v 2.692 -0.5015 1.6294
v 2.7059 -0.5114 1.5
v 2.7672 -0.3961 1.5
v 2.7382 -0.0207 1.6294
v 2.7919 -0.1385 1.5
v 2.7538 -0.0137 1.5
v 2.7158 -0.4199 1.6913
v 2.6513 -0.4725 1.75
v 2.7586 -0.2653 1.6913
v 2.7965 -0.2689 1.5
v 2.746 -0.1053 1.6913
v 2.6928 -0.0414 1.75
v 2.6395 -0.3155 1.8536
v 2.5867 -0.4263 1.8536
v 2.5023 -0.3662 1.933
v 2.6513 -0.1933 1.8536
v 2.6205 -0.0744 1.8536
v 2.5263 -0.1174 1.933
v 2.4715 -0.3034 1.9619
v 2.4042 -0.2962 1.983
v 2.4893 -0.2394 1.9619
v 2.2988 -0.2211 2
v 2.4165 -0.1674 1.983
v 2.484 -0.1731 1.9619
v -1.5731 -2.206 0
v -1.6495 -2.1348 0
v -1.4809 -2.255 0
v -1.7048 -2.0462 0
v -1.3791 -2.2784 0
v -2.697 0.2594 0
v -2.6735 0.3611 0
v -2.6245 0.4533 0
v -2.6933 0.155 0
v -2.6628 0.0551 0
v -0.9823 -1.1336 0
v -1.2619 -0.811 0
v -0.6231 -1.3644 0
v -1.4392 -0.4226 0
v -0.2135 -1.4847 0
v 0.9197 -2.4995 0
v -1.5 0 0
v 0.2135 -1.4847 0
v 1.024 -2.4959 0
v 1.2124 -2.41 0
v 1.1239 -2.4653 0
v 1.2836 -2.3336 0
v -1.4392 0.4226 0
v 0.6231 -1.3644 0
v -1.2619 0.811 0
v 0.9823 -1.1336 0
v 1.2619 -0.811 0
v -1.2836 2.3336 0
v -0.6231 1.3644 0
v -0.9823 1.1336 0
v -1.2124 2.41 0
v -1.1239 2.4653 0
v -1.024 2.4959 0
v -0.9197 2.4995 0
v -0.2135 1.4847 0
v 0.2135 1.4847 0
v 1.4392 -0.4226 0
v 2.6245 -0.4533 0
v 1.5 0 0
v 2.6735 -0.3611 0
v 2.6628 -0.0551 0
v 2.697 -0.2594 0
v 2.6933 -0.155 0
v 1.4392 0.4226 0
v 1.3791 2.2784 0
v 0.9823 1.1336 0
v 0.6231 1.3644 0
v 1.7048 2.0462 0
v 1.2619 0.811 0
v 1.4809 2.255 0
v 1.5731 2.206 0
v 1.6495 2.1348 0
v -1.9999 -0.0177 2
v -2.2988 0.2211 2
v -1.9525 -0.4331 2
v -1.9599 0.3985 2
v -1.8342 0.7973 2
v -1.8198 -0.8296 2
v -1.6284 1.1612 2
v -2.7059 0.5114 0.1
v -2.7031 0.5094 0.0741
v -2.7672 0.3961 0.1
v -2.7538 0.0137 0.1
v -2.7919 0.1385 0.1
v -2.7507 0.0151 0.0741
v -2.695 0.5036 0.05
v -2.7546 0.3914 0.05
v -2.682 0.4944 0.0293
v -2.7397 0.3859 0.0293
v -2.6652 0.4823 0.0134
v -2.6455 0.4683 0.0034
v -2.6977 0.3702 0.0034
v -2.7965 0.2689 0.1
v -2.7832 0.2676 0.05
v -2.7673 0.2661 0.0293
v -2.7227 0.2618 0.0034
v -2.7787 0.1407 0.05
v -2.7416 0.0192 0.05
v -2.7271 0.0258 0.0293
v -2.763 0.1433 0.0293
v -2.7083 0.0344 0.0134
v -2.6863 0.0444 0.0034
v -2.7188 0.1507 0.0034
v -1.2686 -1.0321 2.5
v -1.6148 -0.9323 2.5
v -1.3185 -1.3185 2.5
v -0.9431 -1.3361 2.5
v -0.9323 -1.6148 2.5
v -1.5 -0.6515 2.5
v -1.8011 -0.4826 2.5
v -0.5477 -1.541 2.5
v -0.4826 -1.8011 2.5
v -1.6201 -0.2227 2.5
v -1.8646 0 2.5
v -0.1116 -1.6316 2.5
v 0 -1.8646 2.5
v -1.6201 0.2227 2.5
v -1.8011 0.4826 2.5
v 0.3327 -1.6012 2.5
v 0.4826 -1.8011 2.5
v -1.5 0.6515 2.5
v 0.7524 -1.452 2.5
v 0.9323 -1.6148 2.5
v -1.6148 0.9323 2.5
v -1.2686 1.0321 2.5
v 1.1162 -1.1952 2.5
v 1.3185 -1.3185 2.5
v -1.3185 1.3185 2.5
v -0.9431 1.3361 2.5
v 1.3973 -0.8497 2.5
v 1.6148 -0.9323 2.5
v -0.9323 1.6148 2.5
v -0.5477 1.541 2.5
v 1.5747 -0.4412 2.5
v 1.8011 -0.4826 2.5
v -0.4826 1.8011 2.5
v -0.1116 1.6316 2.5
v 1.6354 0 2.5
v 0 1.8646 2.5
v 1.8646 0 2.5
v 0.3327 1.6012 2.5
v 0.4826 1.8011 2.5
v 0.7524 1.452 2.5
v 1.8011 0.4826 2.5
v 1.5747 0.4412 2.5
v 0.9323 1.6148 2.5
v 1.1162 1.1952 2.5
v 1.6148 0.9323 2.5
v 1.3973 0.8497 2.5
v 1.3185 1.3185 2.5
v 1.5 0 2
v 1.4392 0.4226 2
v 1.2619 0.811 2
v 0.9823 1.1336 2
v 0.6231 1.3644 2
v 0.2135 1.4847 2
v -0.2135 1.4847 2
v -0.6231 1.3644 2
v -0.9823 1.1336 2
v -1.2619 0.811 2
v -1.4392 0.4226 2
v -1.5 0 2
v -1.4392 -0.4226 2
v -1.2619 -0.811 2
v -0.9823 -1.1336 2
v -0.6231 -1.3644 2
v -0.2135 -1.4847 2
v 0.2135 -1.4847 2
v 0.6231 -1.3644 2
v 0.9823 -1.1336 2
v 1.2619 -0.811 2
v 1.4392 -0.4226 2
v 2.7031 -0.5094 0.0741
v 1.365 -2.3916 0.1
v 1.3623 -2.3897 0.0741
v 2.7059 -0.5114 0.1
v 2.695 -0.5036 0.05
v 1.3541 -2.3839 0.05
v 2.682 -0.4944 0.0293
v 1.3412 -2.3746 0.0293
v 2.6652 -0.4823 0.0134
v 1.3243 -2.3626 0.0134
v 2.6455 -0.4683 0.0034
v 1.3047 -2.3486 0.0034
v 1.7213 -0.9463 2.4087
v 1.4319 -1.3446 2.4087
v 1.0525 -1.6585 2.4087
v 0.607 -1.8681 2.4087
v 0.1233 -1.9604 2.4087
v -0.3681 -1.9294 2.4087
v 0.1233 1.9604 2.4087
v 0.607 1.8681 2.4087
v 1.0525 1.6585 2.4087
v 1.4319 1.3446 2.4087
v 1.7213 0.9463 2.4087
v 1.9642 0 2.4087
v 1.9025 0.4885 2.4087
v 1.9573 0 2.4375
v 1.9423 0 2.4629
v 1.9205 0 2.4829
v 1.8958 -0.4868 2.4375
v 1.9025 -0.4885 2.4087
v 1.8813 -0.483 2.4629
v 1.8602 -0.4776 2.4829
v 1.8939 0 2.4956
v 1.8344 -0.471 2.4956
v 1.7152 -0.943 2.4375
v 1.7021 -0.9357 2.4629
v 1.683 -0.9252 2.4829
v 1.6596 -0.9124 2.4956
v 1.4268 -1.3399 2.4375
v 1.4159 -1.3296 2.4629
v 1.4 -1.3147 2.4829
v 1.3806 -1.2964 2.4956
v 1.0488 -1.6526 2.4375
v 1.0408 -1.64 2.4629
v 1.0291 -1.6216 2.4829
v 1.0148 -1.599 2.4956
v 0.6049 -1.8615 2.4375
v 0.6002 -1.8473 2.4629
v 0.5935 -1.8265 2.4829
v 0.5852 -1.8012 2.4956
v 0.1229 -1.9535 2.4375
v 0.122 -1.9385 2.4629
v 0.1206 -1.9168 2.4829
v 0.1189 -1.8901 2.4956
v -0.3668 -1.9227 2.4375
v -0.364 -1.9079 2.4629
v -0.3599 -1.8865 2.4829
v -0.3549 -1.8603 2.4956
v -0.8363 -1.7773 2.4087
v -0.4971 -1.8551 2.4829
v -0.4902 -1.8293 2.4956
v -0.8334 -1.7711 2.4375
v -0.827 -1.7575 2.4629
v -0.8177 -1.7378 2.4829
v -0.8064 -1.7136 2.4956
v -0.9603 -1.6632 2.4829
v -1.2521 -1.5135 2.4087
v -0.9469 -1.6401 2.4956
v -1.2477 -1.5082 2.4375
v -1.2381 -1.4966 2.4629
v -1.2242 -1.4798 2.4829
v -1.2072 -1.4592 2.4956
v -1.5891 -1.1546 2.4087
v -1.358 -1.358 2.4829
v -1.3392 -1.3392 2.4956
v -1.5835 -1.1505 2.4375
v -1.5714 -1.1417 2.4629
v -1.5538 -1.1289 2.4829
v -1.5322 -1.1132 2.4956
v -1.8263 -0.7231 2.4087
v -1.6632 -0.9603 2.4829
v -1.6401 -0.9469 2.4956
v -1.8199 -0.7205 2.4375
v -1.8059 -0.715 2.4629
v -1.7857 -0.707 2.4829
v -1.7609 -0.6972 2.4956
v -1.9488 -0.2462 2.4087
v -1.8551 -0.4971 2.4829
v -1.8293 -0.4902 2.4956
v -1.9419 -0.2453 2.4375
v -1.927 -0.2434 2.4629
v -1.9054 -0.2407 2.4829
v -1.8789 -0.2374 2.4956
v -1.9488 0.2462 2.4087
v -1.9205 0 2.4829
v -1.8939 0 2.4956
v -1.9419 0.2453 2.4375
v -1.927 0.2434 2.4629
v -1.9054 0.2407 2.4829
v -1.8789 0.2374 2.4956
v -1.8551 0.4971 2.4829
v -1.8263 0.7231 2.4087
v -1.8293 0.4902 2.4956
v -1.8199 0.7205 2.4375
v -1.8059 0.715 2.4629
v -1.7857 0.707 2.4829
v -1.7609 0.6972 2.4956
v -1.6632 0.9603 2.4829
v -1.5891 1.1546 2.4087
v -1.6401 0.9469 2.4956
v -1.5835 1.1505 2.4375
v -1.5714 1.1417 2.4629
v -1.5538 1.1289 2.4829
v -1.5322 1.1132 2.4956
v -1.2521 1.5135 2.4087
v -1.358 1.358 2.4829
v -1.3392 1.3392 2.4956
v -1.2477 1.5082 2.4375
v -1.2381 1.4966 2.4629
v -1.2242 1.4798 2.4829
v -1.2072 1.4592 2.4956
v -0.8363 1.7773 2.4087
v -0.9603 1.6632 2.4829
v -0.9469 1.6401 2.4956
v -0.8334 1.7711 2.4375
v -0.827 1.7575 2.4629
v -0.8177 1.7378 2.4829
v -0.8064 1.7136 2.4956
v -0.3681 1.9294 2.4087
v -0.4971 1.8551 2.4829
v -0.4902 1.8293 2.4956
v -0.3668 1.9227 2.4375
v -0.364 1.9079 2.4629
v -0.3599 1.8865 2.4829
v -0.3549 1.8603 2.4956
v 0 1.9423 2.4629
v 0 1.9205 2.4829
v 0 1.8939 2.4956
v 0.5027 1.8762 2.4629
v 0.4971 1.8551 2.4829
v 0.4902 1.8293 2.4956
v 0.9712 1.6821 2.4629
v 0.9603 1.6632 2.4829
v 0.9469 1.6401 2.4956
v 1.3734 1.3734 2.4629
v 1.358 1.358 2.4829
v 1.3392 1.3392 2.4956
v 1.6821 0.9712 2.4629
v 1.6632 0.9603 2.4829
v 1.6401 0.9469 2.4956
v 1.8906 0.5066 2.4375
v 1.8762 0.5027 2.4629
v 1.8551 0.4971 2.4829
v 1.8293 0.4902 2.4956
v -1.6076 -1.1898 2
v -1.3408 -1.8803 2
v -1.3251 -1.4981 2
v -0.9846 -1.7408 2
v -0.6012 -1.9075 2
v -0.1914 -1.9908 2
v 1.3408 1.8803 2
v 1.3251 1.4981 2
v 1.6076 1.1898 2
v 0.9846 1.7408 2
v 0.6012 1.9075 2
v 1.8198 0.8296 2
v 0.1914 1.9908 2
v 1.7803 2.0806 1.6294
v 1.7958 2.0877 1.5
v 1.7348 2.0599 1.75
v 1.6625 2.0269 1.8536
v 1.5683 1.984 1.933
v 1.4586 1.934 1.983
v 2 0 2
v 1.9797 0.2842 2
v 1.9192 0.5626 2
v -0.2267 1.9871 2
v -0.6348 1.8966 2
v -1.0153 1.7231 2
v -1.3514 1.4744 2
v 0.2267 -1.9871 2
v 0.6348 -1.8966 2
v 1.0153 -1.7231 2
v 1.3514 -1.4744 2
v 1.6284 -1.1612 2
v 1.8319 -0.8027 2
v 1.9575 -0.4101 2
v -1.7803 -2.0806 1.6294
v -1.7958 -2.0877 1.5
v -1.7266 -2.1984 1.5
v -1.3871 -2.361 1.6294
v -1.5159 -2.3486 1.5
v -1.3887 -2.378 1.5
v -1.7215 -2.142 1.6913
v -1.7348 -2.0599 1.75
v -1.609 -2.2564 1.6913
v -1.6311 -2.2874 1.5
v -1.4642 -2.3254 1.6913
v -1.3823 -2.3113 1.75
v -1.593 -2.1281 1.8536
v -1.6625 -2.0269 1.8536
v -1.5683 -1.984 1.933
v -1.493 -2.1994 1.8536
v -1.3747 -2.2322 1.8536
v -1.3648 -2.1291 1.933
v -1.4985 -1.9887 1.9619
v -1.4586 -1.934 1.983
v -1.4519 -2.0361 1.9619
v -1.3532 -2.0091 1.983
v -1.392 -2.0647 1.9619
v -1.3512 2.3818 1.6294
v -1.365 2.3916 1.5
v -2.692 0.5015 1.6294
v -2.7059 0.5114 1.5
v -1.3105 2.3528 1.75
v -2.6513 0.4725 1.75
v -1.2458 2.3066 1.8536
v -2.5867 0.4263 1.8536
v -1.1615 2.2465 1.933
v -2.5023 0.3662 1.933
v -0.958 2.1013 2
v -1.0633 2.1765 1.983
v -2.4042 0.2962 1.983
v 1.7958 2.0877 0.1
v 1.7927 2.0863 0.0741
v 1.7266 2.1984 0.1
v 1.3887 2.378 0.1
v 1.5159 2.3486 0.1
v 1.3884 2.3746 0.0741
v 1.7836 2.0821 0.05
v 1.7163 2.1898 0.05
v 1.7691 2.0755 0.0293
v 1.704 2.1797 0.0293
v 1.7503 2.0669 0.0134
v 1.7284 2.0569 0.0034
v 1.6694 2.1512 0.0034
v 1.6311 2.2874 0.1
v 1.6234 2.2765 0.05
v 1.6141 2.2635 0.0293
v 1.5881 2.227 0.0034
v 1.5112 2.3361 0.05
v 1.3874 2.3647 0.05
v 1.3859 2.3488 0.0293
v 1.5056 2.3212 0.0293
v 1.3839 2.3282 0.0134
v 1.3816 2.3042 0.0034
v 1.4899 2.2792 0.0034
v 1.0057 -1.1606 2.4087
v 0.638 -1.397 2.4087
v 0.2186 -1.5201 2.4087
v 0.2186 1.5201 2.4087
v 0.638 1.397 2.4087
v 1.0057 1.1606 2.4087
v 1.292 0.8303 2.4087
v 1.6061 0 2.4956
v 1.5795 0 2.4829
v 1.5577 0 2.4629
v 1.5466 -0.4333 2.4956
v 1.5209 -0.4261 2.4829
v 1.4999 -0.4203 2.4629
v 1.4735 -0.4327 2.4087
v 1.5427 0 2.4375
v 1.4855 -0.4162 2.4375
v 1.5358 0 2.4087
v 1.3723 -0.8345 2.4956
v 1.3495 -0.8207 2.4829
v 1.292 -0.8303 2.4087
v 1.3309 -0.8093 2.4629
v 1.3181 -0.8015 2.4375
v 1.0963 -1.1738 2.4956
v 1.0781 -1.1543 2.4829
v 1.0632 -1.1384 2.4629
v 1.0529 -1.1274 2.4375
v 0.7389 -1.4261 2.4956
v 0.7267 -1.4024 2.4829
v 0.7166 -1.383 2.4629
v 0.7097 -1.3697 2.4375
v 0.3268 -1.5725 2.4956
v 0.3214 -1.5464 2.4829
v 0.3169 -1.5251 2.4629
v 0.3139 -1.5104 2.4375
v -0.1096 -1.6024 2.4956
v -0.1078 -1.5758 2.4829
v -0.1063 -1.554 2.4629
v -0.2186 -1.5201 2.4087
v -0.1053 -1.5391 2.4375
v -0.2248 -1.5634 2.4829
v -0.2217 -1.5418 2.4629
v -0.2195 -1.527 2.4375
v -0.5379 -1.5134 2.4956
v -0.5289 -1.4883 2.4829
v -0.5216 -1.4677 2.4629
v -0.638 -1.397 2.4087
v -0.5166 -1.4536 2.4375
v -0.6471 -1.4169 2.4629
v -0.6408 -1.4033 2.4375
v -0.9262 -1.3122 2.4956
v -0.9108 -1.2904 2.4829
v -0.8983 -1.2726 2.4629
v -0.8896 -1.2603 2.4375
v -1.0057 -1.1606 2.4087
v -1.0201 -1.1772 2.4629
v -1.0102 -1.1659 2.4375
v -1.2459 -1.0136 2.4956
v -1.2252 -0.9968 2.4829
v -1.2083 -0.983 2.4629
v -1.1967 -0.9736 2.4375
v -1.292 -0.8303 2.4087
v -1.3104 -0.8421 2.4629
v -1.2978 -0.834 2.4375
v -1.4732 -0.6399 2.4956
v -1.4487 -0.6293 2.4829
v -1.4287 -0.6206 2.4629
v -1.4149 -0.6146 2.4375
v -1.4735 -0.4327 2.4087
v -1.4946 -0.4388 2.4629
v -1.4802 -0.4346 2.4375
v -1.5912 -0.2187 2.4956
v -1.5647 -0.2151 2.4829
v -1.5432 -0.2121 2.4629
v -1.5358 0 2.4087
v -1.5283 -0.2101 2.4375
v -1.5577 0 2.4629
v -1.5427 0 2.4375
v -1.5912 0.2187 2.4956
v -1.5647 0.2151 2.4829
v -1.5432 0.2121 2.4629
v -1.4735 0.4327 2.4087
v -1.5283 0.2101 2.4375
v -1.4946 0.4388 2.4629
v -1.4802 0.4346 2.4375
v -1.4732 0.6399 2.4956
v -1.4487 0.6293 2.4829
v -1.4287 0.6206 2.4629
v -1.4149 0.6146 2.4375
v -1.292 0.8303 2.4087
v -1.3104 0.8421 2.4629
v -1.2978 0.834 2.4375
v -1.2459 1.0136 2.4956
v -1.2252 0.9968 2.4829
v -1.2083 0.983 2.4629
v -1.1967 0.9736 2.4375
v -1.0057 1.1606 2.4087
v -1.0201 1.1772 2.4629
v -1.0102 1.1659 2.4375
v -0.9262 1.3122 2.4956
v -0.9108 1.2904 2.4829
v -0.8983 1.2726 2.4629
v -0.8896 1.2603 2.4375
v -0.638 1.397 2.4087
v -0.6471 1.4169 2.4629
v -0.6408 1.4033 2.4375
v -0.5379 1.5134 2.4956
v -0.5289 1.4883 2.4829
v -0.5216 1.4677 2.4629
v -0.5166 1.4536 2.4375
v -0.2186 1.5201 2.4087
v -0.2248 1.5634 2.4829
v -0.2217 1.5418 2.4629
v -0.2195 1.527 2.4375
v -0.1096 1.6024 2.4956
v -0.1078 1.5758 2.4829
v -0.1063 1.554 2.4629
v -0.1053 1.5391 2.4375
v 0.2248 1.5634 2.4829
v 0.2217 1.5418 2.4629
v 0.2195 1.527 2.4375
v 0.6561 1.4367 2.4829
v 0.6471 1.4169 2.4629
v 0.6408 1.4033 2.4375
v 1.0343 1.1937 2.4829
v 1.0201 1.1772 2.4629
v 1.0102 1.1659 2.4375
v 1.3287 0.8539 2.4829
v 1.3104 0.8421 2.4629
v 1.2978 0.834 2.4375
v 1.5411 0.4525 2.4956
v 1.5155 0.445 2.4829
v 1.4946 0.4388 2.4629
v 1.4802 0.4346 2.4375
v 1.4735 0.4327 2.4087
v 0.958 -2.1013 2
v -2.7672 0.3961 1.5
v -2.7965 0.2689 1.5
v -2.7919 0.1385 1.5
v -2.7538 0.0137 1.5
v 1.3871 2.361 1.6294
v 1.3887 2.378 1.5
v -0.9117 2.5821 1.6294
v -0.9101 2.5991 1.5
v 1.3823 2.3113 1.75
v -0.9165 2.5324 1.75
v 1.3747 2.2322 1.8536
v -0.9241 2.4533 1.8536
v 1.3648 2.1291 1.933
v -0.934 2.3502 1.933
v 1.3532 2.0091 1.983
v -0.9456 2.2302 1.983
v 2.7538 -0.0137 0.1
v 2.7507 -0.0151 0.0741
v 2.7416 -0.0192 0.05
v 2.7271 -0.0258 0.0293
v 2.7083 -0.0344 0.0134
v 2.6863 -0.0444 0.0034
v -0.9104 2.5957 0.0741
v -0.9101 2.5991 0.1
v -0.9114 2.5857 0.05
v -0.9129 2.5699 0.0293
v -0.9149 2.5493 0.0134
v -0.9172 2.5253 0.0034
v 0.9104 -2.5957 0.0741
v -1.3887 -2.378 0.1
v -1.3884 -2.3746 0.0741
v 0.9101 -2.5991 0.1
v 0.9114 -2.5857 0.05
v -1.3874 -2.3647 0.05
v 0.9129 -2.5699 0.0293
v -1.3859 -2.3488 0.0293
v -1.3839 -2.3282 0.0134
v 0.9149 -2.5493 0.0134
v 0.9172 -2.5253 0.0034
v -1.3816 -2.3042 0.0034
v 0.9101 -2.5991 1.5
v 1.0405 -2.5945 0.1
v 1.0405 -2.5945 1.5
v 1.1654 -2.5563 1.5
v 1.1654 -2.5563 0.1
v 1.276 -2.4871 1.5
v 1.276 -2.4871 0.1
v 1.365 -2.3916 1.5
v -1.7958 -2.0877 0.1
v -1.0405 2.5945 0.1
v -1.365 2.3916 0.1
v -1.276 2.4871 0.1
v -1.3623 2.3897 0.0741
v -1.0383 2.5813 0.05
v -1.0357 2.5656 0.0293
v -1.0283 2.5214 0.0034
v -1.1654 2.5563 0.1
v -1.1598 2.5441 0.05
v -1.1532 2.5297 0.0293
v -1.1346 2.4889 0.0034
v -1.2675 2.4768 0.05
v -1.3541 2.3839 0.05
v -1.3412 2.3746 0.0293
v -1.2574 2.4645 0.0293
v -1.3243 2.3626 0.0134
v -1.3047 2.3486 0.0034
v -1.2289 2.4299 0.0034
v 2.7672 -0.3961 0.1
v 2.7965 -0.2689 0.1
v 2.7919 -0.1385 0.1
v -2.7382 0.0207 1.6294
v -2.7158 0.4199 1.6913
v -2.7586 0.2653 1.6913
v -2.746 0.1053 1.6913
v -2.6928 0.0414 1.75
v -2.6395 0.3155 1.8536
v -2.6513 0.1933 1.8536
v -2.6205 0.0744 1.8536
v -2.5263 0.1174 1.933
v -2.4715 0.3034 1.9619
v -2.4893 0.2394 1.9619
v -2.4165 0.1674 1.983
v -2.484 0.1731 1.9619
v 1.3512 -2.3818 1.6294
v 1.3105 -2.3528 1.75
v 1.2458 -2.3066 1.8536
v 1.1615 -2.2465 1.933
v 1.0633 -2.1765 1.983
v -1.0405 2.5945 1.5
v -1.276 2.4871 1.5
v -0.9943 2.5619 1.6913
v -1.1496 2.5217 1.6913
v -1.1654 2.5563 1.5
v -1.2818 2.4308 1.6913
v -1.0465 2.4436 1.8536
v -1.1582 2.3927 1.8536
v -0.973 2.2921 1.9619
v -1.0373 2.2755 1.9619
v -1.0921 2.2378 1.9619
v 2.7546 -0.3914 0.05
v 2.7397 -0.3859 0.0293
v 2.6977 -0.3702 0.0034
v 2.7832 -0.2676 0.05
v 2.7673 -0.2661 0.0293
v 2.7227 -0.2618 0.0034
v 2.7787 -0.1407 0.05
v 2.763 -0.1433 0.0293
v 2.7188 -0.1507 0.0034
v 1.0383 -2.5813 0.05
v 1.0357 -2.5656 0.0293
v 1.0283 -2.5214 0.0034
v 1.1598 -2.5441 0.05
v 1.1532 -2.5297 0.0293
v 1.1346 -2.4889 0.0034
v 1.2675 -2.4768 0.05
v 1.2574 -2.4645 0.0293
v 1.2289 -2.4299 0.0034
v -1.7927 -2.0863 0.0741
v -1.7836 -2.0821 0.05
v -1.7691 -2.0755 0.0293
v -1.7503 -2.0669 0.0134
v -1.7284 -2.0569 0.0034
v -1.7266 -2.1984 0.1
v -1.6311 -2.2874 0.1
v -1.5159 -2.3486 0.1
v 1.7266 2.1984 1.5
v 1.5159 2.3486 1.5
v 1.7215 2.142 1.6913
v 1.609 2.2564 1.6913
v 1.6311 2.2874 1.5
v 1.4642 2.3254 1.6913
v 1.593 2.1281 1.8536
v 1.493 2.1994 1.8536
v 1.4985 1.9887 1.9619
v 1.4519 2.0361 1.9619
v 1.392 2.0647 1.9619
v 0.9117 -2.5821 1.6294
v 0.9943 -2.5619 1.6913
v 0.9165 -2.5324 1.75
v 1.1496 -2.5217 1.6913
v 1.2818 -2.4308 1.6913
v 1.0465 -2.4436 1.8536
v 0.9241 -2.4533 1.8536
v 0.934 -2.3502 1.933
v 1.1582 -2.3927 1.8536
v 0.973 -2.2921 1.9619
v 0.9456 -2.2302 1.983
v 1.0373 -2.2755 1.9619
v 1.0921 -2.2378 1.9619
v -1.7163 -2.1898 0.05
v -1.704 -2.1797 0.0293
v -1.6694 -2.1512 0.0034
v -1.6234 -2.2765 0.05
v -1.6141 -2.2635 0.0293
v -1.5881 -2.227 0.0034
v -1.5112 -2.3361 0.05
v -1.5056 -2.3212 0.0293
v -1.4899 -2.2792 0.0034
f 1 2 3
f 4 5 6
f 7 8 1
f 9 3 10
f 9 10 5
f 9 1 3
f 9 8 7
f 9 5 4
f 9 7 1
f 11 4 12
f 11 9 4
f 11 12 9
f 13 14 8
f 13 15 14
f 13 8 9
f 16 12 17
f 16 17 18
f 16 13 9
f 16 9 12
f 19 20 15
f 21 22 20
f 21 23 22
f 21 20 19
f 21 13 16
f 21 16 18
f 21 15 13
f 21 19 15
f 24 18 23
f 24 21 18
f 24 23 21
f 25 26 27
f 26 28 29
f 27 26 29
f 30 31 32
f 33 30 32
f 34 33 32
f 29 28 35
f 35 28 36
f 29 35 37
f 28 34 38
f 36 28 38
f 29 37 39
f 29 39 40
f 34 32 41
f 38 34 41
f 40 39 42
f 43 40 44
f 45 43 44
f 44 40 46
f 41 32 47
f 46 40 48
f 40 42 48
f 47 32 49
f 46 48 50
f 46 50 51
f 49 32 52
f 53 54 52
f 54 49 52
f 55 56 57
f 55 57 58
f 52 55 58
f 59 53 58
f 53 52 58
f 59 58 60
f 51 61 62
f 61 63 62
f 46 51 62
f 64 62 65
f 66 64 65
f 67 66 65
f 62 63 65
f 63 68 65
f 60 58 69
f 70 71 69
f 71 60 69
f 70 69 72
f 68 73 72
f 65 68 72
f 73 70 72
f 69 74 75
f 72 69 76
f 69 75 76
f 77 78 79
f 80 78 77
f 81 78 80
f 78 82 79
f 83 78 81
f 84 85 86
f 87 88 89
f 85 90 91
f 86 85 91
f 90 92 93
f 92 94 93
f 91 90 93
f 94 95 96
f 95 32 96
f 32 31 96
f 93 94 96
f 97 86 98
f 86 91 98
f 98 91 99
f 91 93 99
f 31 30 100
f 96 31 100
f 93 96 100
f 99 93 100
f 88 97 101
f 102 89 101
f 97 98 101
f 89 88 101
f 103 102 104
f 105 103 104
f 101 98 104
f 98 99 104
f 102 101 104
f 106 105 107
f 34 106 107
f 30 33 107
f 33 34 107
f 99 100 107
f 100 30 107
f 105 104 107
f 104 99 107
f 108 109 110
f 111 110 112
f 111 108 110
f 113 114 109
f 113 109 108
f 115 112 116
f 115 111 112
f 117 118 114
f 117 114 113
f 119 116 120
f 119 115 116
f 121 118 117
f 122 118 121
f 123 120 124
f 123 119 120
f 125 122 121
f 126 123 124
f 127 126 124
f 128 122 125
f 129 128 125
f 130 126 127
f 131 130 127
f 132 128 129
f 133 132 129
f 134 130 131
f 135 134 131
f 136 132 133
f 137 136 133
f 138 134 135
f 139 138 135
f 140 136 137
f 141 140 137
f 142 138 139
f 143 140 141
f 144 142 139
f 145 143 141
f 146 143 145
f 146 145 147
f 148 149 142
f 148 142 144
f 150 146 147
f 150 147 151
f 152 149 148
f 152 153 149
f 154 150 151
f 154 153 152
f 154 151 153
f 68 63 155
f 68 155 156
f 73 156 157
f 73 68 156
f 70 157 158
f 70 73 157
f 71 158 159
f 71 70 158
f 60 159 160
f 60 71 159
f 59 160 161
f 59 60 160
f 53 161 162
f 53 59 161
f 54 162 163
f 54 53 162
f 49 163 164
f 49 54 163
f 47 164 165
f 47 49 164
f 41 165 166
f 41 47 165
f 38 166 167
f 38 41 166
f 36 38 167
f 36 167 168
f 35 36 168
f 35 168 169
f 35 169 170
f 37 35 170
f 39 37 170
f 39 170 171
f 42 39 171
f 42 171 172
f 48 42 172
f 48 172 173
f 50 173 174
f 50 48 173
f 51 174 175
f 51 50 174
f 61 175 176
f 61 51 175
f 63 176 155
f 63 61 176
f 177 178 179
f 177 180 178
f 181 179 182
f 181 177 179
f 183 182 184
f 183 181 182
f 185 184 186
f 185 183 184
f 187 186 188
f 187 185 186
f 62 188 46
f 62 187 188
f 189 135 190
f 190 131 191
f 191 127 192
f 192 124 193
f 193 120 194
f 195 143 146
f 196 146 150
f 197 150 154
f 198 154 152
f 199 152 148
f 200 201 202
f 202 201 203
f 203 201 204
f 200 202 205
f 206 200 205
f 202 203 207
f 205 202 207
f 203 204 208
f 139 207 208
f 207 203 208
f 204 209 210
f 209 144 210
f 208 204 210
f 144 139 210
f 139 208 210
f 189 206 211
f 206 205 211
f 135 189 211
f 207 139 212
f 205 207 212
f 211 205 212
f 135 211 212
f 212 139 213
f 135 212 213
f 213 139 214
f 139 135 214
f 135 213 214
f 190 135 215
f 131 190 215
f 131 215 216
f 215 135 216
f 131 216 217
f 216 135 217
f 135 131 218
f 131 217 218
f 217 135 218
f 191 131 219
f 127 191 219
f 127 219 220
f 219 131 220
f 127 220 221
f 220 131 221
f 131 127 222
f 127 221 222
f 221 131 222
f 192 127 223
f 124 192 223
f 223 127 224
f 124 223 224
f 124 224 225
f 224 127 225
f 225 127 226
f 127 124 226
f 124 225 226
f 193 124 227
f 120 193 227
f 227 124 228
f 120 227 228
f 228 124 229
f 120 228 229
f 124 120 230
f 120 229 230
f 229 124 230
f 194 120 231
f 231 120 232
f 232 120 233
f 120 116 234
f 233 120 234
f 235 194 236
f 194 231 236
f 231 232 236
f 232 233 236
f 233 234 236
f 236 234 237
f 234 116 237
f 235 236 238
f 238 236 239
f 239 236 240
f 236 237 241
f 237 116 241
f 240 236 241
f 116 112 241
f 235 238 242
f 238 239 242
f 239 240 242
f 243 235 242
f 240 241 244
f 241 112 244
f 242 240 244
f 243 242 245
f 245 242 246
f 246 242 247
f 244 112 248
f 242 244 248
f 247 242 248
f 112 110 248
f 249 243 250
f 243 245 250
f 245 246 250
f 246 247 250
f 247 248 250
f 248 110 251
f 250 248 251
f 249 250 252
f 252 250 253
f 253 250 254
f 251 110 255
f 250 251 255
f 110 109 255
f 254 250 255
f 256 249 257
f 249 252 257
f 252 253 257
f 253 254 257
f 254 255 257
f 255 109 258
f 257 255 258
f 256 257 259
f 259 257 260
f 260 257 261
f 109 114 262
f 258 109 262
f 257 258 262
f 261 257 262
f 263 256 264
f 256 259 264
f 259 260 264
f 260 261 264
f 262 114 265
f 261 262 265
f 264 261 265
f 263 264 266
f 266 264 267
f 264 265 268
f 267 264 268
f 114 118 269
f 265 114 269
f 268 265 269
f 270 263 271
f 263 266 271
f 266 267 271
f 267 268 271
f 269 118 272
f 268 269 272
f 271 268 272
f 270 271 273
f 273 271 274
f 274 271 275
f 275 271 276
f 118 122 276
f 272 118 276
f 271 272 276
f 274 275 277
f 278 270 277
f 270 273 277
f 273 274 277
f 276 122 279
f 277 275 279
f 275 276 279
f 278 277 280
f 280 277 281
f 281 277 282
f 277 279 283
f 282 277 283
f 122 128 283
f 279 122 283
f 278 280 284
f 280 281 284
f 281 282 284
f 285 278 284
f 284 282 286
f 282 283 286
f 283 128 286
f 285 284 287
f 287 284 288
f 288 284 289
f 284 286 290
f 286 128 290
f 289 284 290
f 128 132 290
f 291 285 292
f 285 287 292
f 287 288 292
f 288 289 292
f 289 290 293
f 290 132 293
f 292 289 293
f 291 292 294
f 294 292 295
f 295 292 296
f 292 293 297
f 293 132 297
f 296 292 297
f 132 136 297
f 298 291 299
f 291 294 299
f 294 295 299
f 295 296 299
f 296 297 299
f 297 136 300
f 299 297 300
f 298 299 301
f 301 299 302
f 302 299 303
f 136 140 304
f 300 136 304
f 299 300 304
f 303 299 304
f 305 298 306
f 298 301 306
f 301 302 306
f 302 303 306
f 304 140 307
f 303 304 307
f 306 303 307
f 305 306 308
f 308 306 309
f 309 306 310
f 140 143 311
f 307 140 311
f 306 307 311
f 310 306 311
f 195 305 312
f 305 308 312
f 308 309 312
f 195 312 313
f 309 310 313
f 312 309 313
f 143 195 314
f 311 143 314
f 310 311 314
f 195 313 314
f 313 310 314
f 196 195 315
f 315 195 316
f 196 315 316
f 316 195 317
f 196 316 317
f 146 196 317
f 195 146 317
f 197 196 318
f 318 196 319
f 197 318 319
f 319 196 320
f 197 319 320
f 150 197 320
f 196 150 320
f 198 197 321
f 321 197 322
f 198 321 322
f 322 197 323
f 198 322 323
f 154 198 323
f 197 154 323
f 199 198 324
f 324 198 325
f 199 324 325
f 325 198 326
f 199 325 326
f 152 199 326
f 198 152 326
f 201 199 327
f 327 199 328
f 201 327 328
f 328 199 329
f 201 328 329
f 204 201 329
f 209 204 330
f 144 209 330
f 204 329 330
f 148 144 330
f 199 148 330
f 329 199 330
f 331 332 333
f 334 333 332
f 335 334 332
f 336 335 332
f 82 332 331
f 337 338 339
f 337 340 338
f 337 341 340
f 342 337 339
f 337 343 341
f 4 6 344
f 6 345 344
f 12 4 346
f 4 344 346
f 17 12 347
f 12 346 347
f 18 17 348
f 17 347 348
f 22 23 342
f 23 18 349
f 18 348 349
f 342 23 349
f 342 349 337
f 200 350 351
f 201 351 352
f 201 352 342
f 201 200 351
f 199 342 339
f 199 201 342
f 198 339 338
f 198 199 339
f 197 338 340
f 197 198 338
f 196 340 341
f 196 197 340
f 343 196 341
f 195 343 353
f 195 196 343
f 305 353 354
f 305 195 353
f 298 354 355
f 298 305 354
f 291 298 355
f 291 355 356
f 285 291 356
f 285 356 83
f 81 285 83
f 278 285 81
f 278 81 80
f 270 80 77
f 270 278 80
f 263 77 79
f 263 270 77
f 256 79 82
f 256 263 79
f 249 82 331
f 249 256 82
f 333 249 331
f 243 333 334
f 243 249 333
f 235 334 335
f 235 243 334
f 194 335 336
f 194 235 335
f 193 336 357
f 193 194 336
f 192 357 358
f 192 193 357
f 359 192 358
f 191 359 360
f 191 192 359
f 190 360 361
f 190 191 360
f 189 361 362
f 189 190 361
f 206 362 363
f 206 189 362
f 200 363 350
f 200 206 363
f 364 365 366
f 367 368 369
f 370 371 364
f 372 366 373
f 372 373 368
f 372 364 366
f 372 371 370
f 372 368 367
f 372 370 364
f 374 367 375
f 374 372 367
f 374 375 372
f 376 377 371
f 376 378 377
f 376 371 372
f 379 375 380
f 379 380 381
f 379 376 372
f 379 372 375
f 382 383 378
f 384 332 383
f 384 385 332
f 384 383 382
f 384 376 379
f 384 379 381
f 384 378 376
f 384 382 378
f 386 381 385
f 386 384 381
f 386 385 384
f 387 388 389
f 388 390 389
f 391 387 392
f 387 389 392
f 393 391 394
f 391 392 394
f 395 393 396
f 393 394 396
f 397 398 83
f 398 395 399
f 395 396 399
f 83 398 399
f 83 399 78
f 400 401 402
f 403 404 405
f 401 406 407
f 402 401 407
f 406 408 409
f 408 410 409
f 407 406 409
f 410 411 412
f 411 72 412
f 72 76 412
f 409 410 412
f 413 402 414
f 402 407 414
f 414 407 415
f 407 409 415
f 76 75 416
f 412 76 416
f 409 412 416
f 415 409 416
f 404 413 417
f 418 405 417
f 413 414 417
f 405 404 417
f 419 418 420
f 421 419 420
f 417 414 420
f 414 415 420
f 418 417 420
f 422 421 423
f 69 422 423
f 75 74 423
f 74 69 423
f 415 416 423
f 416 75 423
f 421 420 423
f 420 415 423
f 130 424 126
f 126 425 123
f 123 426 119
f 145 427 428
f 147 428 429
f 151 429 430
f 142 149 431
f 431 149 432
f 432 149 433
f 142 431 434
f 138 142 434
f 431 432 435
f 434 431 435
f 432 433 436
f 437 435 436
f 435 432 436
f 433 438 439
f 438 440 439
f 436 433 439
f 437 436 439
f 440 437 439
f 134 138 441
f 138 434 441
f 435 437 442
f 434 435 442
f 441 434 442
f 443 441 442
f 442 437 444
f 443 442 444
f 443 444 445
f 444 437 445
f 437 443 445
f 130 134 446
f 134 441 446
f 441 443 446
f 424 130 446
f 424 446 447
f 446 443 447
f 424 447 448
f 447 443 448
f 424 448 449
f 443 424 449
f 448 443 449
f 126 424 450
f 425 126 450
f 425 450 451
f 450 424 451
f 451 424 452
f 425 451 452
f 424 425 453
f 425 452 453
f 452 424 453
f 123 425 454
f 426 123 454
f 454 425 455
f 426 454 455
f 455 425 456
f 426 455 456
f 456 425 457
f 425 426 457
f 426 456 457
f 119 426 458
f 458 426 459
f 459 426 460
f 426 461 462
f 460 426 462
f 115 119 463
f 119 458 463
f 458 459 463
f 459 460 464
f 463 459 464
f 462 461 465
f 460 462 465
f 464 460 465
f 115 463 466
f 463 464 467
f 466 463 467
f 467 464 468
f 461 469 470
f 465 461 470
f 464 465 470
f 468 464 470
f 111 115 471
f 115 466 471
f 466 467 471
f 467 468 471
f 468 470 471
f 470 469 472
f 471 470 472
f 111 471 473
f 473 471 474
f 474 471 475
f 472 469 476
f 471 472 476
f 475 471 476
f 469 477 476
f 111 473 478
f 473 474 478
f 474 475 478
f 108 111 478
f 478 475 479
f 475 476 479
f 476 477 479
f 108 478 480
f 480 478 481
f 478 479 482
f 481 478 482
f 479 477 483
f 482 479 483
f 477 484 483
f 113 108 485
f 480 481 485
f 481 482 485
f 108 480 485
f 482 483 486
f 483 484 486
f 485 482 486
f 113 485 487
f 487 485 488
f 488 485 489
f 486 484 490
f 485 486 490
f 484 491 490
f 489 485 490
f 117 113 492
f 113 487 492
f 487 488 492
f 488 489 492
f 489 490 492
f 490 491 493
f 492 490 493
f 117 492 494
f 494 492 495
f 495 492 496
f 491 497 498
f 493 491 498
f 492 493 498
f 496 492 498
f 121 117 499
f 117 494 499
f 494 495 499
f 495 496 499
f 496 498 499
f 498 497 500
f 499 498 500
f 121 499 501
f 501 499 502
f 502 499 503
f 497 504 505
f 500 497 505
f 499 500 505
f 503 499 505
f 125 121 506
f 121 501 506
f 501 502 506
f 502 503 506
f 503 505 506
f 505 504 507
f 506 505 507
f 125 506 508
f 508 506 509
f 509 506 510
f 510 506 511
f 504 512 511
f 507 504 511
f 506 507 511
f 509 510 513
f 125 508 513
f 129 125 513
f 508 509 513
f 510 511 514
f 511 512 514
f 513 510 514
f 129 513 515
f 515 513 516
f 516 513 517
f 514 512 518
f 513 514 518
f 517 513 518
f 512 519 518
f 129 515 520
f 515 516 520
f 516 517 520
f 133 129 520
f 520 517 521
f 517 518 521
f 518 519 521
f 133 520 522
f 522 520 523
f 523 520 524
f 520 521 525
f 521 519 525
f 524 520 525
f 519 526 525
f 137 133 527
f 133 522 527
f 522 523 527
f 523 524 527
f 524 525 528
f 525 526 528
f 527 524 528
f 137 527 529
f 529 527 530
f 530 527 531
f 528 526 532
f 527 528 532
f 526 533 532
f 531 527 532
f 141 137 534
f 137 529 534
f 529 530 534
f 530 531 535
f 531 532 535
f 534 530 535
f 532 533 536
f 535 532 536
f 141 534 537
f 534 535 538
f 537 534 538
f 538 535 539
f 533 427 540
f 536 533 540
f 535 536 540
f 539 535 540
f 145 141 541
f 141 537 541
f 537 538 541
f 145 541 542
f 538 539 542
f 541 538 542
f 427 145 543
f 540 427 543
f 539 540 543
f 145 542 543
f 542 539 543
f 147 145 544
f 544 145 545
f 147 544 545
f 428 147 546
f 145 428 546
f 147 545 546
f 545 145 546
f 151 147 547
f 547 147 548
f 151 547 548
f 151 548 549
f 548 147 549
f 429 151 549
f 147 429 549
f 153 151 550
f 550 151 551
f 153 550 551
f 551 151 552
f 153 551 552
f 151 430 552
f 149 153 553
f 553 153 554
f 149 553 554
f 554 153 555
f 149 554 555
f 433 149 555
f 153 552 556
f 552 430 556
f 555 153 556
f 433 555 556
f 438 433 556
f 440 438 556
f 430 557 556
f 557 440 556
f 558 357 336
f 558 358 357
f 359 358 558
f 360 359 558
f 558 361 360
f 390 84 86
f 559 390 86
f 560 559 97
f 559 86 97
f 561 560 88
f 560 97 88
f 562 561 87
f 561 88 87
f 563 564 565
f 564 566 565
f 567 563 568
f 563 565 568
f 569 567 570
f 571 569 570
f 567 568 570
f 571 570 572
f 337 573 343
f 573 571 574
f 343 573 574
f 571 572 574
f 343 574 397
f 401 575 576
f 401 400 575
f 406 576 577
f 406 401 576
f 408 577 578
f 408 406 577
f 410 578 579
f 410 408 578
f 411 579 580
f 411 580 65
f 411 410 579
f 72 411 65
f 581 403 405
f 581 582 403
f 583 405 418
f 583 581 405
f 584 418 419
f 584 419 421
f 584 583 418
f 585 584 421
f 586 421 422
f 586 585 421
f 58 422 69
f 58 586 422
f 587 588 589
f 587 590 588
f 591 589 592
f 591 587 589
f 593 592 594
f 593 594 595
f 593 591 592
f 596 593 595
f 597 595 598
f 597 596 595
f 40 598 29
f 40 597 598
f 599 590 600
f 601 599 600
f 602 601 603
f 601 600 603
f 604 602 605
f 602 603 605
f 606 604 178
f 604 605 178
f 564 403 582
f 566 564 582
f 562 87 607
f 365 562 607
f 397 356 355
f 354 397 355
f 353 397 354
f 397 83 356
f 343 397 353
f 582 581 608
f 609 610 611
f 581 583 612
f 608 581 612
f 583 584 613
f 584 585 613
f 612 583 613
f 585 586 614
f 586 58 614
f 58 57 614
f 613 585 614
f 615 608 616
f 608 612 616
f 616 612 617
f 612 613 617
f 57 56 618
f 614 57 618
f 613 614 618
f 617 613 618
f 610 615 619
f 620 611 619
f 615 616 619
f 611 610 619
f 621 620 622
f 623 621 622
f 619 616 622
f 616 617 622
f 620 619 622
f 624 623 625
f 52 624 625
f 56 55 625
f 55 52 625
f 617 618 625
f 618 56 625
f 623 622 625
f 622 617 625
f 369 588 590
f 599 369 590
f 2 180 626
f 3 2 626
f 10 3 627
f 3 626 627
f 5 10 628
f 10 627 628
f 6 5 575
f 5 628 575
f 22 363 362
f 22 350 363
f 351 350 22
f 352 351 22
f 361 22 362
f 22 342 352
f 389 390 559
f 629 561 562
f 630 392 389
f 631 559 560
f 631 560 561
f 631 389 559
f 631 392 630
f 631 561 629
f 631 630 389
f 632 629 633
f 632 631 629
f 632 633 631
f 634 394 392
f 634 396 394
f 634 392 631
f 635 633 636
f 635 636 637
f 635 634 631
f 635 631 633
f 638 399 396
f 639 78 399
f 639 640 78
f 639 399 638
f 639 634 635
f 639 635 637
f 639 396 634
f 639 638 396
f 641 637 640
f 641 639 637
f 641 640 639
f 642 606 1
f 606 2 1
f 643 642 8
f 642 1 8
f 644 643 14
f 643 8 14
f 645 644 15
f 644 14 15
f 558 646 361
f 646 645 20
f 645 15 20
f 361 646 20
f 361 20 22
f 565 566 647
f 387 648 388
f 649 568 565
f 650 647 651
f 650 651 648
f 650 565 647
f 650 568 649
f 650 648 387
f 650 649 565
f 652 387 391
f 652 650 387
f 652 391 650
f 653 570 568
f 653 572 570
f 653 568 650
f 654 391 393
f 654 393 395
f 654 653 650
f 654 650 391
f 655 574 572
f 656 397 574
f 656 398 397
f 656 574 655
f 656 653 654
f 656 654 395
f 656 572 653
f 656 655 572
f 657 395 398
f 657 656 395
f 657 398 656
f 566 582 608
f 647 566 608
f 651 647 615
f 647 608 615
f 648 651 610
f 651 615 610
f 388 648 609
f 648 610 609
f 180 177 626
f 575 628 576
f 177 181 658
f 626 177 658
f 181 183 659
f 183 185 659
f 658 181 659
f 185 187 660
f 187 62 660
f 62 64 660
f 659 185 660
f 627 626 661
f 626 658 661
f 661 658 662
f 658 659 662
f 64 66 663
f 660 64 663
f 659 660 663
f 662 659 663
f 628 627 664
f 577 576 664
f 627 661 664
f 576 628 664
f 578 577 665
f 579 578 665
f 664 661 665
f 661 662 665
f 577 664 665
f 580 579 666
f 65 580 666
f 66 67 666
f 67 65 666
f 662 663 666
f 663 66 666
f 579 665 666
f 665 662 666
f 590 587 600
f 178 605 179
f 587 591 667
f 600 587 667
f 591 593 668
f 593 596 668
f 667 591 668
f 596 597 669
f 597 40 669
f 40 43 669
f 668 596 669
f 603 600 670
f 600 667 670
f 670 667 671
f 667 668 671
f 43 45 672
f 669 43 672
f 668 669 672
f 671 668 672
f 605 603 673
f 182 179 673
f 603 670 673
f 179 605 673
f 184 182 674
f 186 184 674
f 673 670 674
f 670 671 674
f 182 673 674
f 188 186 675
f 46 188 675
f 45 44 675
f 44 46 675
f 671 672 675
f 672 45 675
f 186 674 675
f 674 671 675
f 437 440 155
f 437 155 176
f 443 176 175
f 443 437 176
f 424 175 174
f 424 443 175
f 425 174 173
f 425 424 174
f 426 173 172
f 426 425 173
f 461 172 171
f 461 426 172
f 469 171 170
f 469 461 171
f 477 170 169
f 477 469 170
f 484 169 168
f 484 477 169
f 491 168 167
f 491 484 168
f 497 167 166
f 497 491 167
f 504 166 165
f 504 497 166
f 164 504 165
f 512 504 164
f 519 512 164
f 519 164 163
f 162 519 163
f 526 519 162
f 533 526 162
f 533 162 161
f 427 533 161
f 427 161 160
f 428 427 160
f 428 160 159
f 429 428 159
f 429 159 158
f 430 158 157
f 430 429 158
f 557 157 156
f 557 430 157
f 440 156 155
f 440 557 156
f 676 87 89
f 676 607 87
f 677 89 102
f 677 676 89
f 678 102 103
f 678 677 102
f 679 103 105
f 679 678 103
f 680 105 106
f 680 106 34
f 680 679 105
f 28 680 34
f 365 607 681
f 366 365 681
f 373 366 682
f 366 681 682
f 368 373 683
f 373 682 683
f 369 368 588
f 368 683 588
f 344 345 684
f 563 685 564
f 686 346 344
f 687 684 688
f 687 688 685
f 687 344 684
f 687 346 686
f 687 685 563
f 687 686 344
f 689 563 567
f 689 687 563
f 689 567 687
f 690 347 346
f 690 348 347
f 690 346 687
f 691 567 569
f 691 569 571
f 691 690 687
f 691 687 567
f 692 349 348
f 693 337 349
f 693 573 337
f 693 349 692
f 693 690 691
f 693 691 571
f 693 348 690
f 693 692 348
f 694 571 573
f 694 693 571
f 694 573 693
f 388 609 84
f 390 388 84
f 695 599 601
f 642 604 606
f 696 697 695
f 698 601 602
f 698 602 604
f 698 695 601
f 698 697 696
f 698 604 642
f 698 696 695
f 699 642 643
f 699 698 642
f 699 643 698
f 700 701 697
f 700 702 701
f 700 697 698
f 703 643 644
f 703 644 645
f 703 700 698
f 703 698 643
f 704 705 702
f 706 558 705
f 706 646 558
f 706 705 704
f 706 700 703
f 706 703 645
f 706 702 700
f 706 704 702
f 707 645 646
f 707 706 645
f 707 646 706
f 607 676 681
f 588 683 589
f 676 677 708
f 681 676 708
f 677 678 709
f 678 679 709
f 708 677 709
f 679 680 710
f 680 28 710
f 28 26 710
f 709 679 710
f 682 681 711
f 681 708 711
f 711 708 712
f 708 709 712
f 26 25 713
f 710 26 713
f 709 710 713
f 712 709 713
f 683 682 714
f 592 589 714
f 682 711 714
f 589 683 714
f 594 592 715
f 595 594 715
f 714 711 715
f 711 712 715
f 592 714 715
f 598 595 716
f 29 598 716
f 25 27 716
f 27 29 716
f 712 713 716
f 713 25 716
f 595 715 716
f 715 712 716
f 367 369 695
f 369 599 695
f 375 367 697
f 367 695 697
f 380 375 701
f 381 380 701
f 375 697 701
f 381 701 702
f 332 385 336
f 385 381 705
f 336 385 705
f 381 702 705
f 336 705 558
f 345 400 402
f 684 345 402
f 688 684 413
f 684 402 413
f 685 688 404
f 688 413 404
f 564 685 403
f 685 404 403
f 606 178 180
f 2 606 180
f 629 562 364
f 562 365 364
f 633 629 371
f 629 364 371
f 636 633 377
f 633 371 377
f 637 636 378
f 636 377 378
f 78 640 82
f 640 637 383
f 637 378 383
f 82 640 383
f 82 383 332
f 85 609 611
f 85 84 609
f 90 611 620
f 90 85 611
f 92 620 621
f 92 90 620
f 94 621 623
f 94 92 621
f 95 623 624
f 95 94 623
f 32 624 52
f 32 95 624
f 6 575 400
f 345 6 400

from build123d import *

# Parameters (mm, degrees)
SKETCH1_R           = 1.5
BOSS_EXTRUDE1_DEPTH = 2
FILLET1_R           = 0.5
SKETCH3_R           = 2
SKETCH3_R_2         = 1.5
BOSS_EXTRUDE2_DEPTH = 0.5
BOSS_EXTRUDE2_TAPER = 5
FILLET2_R           = 0.1


with BuildPart() as part:
    # Sketch1 → Boss-Extrude1 (new body)
    with BuildSketch(Plane.XY):
        with BuildLine():
            Line((2.753751395, -0.013659805), (1.795799026, 2.087687523))
            ThreePointArc((1.795799026, 2.087687523), (1.631145222, 2.287378341), (1.388705435, 2.377988761))
            Line((1.388705435, 2.377988761), (-0.910090917, 2.599051338))
            ThreePointArc((-0.910090917, 2.599051338), (-1.165355141, 2.55630237), (-1.365045959, 2.391648566))
            Line((-1.365045959, 2.391648566), (-2.705889943, 0.511363815))
            ThreePointArc((-2.705889943, 0.511363815), (-2.796500362, 0.268924029), (-2.753751395, 0.013659805))
            Line((-2.753751395, 0.013659805), (-1.795799026, -2.087687523))
            ThreePointArc((-1.795799026, -2.087687523), (-1.631145222, -2.287378341), (-1.388705435, -2.377988761))
            Line((-1.388705435, -2.377988761), (0.910090917, -2.599051338))
            ThreePointArc((0.910090917, -2.599051338), (1.165355141, -2.55630237), (1.365045959, -2.391648566))
            Line((1.365045959, -2.391648566), (2.705889943, -0.511363815))
            ThreePointArc((2.705889943, -0.511363815), (2.796500362, -0.268924029), (2.753751395, -0.013659805))
        make_face()
        Circle(SKETCH1_R, mode=Mode.SUBTRACT)
    extrude(amount=BOSS_EXTRUDE1_DEPTH)

    # Fillet1
    fillet1_edges = [part.edges().sort_by_distance(p)[0] for p in [
        (1.165355141, -2.55630237, 2),
        (2.035467951, -1.45150619, 2),
        (2.796500362, -0.268924029, 2),
        (2.27477521, 1.037013859, 2),
        (1.631145222, 2.287378341, 2),
        (0.239307259, 2.488520049, 2),
        (-1.165355141, 2.55630237, 2),
        (-2.035467951, 1.45150619, 2),
        (-2.796500362, 0.268924029, 2),
        (-2.27477521, -1.037013859, 2),
        (-1.631145222, -2.287378341, 2),
        (-0.239307259, -2.488520049, 2),
    ]]
    fillet(fillet1_edges, radius=FILLET1_R)

    # Sketch3 → Boss-Extrude2 (add)
    with BuildSketch(Plane.XY.offset(2)):
        Circle(SKETCH3_R)
        Circle(SKETCH3_R_2, mode=Mode.SUBTRACT)
    extrude(amount=BOSS_EXTRUDE2_DEPTH, taper=BOSS_EXTRUDE2_TAPER)

    # Fillet2
    fillet2_edges = [part.edges().sort_by_distance(p)[0] for p in [
        (-2.27477521, -1.037013859, 0),
        (-2.796500362, 0.268924029, 0),
        (-2.035467951, 1.45150619, 0),
        (-1.165355141, 2.55630237, 0),
        (0.239307259, 2.488520049, 0),
        (1.631145222, 2.287378341, 0),
        (2.27477521, 1.037013859, 0),
        (2.796500362, -0.268924029, 0),
        (2.035467951, -1.45150619, 0),
        (1.165355141, -2.55630237, 0),
        (-0.239307259, -2.488520049, 0),
        (-1.631145222, -2.287378341, 0),
        (-1.956255668, 0, 2.5),
        (-1.543744332, 0, 2.5),
    ]]
    fillet(fillet2_edges, radius=FILLET2_R)


solid = part.part
